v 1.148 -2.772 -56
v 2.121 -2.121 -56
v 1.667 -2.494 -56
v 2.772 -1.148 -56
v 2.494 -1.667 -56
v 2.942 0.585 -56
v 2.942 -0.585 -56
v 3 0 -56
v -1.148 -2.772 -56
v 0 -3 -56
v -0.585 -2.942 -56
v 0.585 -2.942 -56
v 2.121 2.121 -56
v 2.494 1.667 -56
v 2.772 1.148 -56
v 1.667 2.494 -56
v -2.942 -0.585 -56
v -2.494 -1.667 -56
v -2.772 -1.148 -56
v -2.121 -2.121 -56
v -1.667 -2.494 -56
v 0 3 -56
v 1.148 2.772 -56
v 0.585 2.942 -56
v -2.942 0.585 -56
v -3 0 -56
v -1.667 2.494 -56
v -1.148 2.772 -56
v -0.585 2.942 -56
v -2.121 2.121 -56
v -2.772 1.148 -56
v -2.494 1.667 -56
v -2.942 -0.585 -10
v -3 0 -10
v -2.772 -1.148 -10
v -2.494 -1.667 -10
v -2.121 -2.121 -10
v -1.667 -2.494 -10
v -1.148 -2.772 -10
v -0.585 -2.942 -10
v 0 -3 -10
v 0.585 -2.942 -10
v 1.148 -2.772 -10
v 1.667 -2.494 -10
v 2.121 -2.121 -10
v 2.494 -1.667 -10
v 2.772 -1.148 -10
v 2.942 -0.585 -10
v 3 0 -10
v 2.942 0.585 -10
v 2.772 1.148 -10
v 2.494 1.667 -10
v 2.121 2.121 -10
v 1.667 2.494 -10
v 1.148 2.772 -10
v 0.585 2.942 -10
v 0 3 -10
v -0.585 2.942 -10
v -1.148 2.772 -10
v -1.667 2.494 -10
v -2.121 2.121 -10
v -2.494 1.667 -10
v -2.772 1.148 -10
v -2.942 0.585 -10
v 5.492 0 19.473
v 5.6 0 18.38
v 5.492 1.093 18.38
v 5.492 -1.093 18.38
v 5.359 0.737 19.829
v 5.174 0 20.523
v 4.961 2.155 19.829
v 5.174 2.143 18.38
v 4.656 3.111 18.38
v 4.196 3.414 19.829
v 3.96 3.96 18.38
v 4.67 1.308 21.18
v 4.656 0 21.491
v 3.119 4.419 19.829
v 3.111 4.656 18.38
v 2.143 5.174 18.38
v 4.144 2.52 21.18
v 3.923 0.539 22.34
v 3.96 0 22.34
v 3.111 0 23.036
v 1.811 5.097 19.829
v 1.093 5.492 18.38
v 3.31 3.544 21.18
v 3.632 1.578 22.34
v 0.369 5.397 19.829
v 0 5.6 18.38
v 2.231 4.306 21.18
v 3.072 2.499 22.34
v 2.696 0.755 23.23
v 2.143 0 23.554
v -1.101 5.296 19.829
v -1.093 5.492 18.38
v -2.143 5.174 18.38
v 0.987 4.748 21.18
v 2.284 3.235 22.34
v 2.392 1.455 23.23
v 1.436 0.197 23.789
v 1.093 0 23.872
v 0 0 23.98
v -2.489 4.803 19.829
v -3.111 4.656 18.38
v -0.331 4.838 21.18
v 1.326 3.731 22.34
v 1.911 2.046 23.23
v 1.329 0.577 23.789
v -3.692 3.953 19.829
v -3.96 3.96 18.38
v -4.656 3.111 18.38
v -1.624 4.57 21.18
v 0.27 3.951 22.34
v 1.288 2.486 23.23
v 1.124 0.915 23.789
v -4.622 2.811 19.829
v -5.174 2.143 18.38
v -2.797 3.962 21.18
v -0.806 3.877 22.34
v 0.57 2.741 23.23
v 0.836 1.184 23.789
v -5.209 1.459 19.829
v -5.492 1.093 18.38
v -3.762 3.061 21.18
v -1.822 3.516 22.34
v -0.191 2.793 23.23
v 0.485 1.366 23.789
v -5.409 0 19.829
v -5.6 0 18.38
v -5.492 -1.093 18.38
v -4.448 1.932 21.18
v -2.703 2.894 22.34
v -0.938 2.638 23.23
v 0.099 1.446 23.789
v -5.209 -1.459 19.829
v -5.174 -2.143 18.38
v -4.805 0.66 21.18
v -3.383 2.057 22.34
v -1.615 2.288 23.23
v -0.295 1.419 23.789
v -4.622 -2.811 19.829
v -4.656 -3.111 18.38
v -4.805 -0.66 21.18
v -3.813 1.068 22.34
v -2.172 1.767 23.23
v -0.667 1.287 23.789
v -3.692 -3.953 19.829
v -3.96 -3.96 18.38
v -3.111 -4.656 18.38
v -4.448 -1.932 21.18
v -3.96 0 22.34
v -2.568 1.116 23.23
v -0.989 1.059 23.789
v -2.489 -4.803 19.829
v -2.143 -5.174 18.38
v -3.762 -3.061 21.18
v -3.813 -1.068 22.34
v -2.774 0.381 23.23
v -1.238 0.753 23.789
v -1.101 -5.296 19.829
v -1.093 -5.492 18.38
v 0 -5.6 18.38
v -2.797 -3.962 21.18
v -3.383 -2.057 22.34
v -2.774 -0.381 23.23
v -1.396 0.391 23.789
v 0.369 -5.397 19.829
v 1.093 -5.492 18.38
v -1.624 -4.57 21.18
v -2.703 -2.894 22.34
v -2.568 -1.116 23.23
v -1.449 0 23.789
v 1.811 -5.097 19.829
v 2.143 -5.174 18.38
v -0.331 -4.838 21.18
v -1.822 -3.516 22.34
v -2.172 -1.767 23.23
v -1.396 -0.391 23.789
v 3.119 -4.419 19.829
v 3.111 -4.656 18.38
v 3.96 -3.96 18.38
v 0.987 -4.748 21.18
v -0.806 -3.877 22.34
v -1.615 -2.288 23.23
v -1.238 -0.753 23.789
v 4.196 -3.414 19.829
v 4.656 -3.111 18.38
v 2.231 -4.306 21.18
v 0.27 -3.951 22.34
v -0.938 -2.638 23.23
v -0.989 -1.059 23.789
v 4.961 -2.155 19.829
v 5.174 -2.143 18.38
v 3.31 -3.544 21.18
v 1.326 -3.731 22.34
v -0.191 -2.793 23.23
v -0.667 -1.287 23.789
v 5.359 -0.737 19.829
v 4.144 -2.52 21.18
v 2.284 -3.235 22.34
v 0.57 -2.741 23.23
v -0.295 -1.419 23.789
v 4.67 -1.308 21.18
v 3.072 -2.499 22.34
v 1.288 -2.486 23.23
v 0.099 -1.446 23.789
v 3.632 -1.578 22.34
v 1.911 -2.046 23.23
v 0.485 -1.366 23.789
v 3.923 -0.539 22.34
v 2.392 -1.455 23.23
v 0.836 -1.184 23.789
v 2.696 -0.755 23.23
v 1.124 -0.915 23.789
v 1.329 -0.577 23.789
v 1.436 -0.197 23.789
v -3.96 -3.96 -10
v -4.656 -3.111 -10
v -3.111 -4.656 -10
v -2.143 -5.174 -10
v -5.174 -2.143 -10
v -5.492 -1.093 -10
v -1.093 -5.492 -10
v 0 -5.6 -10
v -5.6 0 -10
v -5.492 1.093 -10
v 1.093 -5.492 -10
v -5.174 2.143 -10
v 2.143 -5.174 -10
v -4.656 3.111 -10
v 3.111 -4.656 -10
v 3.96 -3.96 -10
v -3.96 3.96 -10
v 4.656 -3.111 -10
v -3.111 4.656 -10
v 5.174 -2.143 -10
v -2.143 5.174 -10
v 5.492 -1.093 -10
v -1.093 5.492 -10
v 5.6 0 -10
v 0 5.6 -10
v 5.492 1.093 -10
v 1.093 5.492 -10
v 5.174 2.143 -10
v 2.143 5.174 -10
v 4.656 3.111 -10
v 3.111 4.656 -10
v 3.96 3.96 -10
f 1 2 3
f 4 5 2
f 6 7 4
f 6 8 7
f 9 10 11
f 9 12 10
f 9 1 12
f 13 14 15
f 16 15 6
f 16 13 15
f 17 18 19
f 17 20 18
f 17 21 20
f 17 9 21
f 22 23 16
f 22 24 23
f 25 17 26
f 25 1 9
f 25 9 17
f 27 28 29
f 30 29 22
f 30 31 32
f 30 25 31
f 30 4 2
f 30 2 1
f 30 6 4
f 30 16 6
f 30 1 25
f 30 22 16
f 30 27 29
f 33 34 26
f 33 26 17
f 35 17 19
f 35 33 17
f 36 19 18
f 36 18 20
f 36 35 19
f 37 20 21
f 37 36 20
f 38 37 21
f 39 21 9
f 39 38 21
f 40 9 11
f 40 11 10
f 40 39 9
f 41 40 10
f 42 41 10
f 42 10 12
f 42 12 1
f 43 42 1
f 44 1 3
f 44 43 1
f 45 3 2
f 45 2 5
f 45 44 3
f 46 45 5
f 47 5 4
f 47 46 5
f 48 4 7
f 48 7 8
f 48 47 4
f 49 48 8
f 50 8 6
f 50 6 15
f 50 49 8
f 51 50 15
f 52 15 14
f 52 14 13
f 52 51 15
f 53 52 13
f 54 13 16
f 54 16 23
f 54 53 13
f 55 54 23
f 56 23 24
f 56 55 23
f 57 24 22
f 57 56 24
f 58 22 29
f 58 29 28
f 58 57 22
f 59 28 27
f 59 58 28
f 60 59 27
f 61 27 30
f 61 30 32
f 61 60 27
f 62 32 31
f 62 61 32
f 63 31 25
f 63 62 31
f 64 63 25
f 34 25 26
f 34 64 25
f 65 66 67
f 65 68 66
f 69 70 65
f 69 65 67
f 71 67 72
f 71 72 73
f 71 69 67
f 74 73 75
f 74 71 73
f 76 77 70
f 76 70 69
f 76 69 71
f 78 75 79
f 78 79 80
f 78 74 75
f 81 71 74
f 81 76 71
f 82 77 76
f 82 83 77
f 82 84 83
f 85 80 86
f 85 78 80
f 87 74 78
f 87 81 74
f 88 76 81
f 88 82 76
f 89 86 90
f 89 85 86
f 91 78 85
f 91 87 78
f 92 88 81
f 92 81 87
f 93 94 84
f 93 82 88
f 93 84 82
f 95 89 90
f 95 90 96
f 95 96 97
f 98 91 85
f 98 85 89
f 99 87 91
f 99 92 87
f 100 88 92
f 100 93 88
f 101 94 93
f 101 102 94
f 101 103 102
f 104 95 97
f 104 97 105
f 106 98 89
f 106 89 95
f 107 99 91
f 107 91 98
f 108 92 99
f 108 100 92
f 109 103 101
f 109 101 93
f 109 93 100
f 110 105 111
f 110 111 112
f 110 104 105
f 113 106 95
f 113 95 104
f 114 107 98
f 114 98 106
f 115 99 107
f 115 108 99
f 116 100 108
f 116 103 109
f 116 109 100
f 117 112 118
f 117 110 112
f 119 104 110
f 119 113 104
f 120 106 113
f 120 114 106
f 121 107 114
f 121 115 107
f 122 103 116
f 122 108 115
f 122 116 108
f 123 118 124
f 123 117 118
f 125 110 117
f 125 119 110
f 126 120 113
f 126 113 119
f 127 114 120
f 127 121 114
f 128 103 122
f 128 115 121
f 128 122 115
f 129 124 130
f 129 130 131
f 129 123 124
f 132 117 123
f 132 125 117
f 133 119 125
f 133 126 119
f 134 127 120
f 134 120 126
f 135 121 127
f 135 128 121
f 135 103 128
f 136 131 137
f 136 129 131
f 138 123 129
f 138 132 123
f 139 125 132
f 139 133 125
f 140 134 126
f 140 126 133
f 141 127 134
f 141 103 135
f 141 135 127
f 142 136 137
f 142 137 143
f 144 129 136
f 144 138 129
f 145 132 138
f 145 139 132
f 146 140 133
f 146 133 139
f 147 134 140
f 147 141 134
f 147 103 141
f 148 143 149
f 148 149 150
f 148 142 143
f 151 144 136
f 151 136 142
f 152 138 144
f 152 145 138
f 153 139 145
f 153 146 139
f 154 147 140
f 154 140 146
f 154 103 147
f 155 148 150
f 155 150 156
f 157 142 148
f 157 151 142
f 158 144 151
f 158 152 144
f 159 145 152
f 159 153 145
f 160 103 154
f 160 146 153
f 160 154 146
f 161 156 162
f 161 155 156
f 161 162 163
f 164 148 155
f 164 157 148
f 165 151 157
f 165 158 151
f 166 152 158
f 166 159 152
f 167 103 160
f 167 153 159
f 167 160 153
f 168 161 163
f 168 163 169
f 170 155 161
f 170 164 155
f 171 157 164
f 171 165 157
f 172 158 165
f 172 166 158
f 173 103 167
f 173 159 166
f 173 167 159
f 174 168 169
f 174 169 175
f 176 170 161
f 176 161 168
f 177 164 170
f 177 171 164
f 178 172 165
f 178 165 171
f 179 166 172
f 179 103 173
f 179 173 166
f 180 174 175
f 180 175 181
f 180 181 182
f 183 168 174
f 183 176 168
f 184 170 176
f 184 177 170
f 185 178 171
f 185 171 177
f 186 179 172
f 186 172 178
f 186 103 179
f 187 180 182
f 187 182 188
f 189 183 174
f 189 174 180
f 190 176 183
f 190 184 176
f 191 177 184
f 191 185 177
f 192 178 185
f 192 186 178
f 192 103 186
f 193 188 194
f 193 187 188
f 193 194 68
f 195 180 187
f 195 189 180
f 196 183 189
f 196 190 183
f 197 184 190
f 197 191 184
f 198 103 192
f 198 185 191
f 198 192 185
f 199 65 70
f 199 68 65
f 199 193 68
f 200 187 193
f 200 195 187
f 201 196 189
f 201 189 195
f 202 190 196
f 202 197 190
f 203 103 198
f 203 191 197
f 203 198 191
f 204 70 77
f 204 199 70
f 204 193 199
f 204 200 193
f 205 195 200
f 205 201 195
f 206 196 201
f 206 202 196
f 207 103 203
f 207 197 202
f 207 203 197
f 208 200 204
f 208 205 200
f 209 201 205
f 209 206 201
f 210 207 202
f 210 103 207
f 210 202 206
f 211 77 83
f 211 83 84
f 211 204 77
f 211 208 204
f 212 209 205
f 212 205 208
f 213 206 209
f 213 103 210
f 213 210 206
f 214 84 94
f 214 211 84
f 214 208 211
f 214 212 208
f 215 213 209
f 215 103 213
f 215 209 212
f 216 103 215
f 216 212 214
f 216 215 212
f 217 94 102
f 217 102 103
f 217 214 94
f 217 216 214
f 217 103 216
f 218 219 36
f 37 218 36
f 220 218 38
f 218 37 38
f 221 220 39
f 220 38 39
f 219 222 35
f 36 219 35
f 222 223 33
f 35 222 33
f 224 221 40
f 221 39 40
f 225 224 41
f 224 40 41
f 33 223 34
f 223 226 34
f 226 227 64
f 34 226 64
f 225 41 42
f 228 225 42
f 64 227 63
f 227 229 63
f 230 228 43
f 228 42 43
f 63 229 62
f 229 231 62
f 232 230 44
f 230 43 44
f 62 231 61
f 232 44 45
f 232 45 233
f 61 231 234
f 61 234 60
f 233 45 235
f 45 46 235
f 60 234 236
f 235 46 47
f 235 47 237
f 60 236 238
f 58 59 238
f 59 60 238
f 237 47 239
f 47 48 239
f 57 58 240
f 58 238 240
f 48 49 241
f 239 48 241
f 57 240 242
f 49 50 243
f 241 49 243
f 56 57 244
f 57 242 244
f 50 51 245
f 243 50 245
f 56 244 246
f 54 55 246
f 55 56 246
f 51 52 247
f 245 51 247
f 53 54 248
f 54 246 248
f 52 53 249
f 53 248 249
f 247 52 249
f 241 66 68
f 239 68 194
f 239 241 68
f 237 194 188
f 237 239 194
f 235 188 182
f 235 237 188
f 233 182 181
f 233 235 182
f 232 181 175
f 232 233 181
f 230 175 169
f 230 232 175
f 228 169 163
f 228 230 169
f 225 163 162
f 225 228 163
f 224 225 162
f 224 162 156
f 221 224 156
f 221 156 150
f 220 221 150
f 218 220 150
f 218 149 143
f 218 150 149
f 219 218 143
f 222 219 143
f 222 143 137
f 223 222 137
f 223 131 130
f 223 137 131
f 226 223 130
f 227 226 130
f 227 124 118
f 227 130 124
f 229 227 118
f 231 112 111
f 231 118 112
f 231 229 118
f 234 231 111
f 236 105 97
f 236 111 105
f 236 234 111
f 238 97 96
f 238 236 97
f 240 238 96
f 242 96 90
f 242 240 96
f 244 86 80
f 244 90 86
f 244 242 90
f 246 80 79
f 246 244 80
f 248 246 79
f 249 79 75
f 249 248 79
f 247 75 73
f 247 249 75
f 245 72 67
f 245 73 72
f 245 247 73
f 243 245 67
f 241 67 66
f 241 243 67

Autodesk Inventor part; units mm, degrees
ref_plane "YZ Plane" through (0, 0, 0) normal (1, 0, 0) x (0, 1, 0)
ref_plane "XZ Plane" through (0, 0, 0) normal (0, 1, 0) x (-1, 0, 0)
ref_plane "XY Plane" through (0, 0, 0) normal (0, 0, 1) x (1, 0, 0)
sketch "Sketch1" plane through (0, 0, 0) normal (0, 0, 1) x (1, 0, 0)
  circle A0 centre (0, 0) radius 6
  dimension "d0" = 12
extrude "Extrusion1" add sketch "Sketch1" along normal blind 24.38 and the other way blind 10
fillet "Fillet1" radius 6 1 edges at (-6, 0, 24.38)
sketch "Sketch2" plane through (0, 0, -10) normal (0, 0, -1) x (-1, 0, 0)
  circle A0 centre (0, 0) radius 3.4
  dimension "d6" = 6.8
extrude "Extrusion2" add sketch "Sketch2" along normal blind 46
thicken "Thicken1" operation add thickness 0.4 both sides no extend neighbours yes toward (-0.9870503, 0.1604113, 0) faces at (5.9223, -0.9625, 12.2533) (5.9223, -0.9625, -6.6667) (-5.8689, 0, 19.6275)
thicken "Thicken2" operation add thickness 0.4 both sides no extend neighbours yes toward (0.9967573, -0.0804666, 0) faces at (-3.389, 0.2736, -25.3333)
properties part number "SpringRod"
